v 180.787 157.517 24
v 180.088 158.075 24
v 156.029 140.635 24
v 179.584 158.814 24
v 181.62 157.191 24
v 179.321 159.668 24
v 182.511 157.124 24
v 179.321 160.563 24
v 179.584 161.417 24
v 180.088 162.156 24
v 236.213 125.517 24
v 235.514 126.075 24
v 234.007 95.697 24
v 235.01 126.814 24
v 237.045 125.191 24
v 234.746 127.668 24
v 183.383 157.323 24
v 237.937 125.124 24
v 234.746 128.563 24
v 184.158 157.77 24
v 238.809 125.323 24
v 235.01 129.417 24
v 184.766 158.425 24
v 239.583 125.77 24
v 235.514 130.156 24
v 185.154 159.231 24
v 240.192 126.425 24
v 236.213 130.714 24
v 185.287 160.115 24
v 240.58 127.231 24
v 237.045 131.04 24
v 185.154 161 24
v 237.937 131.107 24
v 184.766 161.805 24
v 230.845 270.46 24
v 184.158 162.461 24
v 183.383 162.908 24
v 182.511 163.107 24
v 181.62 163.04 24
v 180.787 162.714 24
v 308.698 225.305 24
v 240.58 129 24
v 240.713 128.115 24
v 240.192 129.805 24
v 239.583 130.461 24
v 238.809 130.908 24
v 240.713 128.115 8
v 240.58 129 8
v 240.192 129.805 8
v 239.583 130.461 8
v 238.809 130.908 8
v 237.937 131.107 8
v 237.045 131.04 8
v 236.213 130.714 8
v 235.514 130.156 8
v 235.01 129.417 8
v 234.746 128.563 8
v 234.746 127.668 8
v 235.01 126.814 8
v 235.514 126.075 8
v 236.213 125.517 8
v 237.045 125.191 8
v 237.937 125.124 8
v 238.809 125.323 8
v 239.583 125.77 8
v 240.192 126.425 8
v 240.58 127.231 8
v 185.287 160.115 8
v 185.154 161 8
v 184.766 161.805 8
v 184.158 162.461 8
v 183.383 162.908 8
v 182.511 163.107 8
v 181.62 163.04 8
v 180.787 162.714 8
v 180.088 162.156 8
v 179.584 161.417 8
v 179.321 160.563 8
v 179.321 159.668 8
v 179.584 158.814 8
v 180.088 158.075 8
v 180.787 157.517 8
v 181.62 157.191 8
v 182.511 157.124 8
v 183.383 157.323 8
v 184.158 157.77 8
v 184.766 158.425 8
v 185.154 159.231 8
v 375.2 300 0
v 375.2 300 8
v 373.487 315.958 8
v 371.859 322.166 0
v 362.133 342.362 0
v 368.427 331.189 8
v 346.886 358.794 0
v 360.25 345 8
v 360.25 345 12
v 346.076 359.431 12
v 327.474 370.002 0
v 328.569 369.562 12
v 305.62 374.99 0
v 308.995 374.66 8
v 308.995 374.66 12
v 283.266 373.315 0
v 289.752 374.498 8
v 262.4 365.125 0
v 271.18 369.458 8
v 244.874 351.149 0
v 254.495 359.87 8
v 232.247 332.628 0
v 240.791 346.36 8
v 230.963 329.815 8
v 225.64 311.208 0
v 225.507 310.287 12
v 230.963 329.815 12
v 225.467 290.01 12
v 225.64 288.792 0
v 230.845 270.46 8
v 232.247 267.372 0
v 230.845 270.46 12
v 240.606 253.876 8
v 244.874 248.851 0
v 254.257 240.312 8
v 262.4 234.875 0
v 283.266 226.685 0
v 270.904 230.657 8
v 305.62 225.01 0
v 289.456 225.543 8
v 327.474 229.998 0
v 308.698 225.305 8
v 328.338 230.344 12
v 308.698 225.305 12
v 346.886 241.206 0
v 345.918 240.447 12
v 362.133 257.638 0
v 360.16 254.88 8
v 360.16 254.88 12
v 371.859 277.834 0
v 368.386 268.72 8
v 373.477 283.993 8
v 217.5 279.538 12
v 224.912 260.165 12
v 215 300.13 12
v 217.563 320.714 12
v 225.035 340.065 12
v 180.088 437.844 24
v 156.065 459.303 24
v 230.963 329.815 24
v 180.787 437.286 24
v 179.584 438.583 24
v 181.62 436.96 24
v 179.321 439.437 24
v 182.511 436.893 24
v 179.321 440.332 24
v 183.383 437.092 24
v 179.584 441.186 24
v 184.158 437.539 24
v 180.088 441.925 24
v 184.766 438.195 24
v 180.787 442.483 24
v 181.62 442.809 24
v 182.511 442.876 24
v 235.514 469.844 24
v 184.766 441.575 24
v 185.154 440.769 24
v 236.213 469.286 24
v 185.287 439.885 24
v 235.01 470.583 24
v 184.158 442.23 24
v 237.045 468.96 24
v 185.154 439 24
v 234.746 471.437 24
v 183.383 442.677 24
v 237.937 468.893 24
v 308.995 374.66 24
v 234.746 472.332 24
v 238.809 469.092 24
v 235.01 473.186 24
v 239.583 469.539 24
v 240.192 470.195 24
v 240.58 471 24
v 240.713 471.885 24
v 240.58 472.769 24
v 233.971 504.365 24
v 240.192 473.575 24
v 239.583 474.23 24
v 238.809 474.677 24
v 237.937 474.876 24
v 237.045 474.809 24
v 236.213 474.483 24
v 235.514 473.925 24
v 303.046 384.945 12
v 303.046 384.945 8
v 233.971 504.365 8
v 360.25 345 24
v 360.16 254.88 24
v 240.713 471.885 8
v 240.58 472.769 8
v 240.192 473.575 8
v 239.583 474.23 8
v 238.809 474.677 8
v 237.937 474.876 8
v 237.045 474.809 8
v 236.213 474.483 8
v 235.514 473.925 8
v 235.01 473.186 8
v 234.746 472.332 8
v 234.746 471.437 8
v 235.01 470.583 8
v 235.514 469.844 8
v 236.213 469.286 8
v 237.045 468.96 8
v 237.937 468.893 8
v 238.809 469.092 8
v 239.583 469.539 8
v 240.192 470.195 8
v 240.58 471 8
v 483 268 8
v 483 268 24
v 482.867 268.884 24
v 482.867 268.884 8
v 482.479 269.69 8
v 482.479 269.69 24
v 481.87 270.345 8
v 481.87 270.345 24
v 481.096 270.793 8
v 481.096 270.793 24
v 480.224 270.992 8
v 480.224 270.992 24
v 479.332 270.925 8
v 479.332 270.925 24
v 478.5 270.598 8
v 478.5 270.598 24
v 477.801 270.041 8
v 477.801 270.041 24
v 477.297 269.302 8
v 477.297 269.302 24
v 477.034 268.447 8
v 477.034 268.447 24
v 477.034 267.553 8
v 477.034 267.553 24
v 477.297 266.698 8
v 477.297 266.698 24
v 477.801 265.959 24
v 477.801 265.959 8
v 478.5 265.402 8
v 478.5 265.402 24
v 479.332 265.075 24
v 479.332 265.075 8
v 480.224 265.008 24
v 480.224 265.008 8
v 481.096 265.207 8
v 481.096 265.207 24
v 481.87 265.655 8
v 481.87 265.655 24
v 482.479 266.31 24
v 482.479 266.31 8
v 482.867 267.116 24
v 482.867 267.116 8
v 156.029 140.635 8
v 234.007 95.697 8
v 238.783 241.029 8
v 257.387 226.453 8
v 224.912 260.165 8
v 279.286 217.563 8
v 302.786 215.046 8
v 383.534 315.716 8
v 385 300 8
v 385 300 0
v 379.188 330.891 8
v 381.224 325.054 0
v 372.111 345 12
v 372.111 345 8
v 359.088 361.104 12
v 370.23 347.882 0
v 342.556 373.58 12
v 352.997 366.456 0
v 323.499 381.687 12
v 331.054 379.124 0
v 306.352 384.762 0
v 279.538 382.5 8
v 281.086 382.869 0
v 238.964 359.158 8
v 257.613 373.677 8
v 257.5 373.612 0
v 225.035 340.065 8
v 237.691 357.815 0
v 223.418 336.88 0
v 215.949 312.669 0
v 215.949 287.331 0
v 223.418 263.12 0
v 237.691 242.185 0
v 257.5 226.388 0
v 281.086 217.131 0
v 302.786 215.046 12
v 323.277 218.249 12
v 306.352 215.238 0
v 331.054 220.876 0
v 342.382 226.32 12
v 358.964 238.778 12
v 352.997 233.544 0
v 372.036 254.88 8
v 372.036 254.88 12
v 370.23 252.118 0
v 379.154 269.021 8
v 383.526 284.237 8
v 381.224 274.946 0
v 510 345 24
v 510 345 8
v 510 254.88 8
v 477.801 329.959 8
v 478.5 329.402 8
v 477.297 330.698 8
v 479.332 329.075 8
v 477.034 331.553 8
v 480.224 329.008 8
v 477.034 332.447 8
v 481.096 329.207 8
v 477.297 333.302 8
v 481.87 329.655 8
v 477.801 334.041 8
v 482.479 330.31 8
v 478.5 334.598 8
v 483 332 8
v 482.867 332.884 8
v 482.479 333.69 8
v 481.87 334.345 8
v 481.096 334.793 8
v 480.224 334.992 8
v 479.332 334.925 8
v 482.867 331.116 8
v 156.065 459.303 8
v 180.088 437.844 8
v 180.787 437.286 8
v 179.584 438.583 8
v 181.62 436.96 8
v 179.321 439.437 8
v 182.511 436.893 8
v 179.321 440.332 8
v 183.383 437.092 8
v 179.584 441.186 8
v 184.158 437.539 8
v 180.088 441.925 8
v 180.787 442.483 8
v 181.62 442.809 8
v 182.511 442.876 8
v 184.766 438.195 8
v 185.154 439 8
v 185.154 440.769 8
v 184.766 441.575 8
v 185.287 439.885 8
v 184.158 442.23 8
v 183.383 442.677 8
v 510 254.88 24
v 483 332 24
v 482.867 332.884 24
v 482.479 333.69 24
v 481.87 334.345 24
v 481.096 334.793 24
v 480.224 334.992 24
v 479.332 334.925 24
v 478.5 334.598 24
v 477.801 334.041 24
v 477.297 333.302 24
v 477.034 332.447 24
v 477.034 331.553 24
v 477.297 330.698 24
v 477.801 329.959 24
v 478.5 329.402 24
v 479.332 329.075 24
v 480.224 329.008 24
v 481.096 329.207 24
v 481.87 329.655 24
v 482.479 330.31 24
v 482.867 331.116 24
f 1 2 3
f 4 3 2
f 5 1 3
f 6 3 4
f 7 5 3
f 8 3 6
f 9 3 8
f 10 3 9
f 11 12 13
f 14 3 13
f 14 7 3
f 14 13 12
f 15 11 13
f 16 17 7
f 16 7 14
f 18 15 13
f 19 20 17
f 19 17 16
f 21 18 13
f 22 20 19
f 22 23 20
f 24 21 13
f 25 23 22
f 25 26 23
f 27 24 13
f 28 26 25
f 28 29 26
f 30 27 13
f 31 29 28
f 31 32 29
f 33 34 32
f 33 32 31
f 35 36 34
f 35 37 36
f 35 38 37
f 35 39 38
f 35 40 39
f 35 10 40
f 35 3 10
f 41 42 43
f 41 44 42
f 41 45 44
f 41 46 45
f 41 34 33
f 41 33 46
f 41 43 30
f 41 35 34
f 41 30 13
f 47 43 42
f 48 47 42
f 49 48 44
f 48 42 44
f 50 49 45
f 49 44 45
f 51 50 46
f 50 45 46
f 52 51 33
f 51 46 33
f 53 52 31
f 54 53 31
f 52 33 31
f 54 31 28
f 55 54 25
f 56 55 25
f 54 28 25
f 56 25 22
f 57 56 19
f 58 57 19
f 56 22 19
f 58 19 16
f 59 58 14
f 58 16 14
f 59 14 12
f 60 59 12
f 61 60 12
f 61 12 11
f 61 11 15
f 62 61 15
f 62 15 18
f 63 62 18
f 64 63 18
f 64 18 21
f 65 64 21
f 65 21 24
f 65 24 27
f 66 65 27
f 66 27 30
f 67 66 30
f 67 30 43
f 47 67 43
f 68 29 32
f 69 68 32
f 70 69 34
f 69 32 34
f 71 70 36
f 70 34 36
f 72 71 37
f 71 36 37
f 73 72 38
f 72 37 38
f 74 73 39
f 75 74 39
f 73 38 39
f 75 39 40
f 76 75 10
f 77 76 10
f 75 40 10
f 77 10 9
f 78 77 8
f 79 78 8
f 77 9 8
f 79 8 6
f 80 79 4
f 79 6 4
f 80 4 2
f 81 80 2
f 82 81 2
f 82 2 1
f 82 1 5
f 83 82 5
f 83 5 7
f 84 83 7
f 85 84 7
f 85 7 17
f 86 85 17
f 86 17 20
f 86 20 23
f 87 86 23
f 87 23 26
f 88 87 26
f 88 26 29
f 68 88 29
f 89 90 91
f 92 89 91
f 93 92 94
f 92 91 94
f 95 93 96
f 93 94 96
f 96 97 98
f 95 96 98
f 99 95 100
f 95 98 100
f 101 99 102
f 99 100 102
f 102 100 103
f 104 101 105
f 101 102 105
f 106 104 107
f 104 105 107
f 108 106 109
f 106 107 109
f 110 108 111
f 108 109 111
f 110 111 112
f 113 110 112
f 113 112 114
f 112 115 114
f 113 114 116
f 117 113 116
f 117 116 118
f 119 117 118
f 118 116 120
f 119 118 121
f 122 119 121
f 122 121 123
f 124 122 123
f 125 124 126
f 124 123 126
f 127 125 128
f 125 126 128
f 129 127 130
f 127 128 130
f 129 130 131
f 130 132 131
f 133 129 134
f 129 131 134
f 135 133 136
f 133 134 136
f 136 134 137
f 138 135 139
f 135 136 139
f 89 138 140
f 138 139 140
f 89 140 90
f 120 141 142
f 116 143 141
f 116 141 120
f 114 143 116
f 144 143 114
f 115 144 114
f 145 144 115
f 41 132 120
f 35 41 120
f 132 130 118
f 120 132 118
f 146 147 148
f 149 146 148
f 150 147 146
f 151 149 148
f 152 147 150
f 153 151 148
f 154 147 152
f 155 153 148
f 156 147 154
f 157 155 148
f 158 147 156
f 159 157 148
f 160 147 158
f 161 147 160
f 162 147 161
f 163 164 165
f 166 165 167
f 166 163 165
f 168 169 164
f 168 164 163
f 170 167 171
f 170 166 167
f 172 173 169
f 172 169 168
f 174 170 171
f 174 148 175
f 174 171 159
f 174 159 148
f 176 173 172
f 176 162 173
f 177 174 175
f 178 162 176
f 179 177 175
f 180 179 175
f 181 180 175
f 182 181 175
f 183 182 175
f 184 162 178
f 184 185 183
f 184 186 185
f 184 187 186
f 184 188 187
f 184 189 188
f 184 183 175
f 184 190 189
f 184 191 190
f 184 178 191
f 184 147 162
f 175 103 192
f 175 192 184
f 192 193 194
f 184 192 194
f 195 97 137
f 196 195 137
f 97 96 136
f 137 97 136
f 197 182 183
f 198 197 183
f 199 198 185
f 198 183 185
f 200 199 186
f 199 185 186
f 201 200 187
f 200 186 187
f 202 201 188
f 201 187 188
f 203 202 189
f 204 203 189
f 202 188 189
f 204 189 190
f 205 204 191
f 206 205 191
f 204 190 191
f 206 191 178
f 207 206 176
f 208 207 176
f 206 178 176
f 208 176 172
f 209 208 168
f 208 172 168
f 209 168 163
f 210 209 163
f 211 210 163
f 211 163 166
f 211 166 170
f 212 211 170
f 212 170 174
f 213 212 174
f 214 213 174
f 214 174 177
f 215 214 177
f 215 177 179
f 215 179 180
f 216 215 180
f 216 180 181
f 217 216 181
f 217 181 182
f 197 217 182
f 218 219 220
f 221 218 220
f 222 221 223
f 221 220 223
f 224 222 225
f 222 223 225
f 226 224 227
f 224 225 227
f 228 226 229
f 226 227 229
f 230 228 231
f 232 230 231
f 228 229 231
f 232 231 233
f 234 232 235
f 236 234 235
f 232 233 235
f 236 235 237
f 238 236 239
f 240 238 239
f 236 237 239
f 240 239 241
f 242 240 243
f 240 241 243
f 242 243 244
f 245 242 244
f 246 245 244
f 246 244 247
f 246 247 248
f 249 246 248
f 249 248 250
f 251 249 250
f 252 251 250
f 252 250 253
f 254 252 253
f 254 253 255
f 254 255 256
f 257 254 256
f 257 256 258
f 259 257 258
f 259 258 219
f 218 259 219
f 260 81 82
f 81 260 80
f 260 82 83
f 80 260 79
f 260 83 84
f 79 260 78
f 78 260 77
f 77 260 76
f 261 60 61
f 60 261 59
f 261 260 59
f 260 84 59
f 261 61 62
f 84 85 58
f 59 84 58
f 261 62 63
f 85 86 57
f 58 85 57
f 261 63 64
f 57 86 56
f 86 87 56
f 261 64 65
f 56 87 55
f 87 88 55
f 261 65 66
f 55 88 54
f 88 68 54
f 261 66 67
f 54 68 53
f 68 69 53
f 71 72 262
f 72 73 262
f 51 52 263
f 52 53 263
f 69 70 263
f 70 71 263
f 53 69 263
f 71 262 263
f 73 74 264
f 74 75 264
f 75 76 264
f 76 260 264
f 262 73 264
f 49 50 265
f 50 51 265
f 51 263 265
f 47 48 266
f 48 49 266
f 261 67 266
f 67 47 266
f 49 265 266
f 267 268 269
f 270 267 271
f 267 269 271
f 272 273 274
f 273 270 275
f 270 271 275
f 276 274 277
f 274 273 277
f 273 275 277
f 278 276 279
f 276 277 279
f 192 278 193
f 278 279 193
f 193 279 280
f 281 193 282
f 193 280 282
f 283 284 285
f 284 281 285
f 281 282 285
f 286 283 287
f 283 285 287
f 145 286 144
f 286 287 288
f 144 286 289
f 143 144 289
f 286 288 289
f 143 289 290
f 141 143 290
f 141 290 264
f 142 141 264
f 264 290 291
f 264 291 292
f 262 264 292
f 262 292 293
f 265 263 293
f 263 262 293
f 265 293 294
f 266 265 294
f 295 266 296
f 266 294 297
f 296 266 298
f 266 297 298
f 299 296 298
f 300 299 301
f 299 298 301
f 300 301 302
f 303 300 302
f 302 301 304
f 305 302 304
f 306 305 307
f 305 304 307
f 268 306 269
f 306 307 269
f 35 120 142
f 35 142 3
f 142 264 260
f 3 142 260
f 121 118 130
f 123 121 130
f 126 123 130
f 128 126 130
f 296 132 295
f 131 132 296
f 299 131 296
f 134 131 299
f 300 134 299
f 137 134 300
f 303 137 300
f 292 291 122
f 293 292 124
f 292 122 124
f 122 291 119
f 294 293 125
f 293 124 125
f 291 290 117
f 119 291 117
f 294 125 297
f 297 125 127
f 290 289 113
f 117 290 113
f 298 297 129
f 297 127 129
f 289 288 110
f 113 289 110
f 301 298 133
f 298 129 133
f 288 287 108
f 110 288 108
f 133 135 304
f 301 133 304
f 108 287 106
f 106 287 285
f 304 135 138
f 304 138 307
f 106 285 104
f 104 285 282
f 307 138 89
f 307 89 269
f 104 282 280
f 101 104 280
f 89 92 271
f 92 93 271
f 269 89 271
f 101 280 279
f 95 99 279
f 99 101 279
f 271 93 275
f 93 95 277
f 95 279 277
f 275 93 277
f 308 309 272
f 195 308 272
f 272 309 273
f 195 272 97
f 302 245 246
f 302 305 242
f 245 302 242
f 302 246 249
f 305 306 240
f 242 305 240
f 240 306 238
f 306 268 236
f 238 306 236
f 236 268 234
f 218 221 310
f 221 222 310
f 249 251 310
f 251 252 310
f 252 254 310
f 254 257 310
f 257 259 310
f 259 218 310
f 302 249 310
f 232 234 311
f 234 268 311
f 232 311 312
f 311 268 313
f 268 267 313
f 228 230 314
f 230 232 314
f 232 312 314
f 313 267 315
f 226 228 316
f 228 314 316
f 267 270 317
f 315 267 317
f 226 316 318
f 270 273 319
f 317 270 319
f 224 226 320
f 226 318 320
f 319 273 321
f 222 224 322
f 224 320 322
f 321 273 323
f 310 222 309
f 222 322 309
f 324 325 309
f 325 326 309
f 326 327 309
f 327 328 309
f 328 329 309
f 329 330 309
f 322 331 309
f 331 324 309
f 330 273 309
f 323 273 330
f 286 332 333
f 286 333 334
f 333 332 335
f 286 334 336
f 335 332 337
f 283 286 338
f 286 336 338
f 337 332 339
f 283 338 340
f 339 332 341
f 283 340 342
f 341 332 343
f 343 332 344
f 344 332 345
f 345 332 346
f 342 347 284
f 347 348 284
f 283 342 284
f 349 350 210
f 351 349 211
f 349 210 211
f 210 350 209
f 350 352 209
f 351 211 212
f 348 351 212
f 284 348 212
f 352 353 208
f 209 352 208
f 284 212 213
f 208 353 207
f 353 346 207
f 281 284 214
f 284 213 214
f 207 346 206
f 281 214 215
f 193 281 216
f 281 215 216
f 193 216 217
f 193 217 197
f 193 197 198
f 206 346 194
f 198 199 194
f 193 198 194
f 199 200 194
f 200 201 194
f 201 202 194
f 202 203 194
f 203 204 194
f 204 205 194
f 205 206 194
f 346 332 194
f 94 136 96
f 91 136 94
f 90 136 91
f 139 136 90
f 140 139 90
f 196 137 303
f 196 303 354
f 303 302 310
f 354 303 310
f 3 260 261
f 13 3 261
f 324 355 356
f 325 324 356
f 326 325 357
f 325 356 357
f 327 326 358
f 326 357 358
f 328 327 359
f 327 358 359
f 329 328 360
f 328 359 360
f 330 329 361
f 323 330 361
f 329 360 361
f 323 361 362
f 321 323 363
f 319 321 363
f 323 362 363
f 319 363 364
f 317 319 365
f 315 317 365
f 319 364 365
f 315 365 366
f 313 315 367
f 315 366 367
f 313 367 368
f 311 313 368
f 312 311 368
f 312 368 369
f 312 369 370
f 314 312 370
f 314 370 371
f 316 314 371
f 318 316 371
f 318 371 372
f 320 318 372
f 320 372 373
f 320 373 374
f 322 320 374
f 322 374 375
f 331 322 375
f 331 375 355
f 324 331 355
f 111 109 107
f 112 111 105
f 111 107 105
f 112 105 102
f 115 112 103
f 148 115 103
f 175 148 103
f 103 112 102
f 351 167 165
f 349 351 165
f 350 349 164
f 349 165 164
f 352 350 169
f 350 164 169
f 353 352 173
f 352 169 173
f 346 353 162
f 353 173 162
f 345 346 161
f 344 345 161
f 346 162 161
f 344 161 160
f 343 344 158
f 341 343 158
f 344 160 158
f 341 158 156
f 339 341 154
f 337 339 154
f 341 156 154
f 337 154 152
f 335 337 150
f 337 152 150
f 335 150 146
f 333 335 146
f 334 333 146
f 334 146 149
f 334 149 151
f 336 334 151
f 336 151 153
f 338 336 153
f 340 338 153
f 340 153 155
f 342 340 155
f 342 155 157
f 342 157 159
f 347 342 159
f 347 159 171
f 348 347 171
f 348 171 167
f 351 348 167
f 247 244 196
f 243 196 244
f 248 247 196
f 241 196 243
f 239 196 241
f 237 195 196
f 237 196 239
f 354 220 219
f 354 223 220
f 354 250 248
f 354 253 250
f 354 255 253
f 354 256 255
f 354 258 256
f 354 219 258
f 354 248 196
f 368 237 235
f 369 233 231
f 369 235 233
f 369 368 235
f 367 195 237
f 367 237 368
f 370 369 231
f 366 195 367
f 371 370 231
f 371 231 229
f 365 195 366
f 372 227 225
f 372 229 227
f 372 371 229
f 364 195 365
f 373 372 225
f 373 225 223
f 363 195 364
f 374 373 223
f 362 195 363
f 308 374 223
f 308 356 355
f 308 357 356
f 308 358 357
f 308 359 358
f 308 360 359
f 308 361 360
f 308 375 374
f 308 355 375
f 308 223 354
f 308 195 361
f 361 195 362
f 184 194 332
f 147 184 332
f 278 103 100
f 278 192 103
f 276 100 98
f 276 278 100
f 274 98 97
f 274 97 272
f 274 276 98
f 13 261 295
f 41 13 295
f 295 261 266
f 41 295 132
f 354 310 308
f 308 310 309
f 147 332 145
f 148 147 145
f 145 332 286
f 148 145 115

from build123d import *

# Parameters (mm, degrees)
SKETCH1_R           = 85
BOSS_EXTRUDE1_DEPTH = 12
SKETCH2_R           = 75.2
CUT_EXTRUDE1_DEPTH  = 32
BOSS_EXTRUDE2_DEPTH = 16
SKETCH4_R           = 3
CUT_EXTRUDE2_DEPTH  = 44
SKETCH5_R           = 3
CUT_EXTRUDE3_DEPTH  = 44
BOSS_EXTRUDE3_DEPTH = 16
SKETCH7_R           = 3
CUT_EXTRUDE4_DEPTH  = 44
SKETCH8_R           = 3
CUT_EXTRUDE5_DEPTH  = 44
BOSS_EXTRUDE4_DEPTH = 16
SKETCH10_R          = 3
CUT_EXTRUDE6_DEPTH  = 44
SKETCH11_R          = 3
CUT_EXTRUDE7_DEPTH  = 44


with BuildPart() as part:
    # Sketch1 → Boss-Extrude1 (new body)
    with BuildSketch(Plane.XY):
        with Locations((300, 300)):
            Circle(SKETCH1_R)
    extrude(amount=BOSS_EXTRUDE1_DEPTH)

    # Sketch2 → Cut-Extrude1 (cut)
    with BuildSketch(Plane.XY.offset(12)):
        with Locations((300, 300)):
            Circle(SKETCH2_R)
    extrude(amount=-CUT_EXTRUDE1_DEPTH, mode=Mode.SUBTRACT)

    # Sketch3 → Boss-Extrude2 (add)
    with BuildSketch(Plane.XY.offset(8)):
        Polygon((360.16, 254.88), (510, 254.88), (510, 345), (360.249813278, 345), align=None)
    extrude(amount=BOSS_EXTRUDE2_DEPTH)

    # Sketch4 → Cut-Extrude2 (cut)
    with BuildSketch(Plane.XY.offset(24)):
        with Locations((480, 268)):
            Circle(SKETCH4_R)
    extrude(amount=-CUT_EXTRUDE2_DEPTH, mode=Mode.SUBTRACT)

    # Sketch5 → Cut-Extrude3 (cut)
    with BuildSketch(Plane.XY.offset(24)):
        with Locations((480, 332)):
            Circle(SKETCH5_R)
    extrude(amount=-CUT_EXTRUDE3_DEPTH, mode=Mode.SUBTRACT)

    # Sketch6 → Boss-Extrude3 (add)
    with BuildSketch(Plane.XY.offset(8)):
        Polygon((308.995066219, 374.660088292), (233.97114317, 504.365334795), (156.064945237, 459.302943285), (230.963081874, 329.815162849), align=None)
    extrude(amount=BOSS_EXTRUDE3_DEPTH)

    # Sketch7 → Cut-Extrude4 (cut)
    with BuildSketch(Plane.XY.offset(24)):
        with Locations((237.712812921, 471.884572681)):
            Circle(SKETCH7_R)
    extrude(amount=-CUT_EXTRUDE4_DEPTH, mode=Mode.SUBTRACT)

    # Sketch8 → Cut-Extrude5 (cut)
    with BuildSketch(Plane.XY.offset(24)):
        with Locations((182.287187079, 439.884572681)):
            Circle(SKETCH8_R)
    extrude(amount=-CUT_EXTRUDE5_DEPTH, mode=Mode.SUBTRACT)

    # Sketch9 → Boss-Extrude4 (add)
    with BuildSketch(Plane.XY.offset(8)):
        Polygon((230.844933781, 270.459911708), (156.02885683, 140.634665205), (234.007131599, 95.697114438), (308.697770617, 225.30469368), align=None)
    extrude(amount=BOSS_EXTRUDE4_DEPTH)

    # Sketch10 → Cut-Extrude6 (cut)
    with BuildSketch(Plane.XY.offset(24)):
        with Locations((182.287187079, 160.115427319)):
            Circle(SKETCH10_R)
    extrude(amount=-CUT_EXTRUDE6_DEPTH, mode=Mode.SUBTRACT)

    # Sketch11 → Cut-Extrude7 (cut)
    with BuildSketch(Plane.XY.offset(24)):
        with Locations((237.712812921, 128.115427319)):
            Circle(SKETCH11_R)
    extrude(amount=-CUT_EXTRUDE7_DEPTH, mode=Mode.SUBTRACT)


solid = part.part
